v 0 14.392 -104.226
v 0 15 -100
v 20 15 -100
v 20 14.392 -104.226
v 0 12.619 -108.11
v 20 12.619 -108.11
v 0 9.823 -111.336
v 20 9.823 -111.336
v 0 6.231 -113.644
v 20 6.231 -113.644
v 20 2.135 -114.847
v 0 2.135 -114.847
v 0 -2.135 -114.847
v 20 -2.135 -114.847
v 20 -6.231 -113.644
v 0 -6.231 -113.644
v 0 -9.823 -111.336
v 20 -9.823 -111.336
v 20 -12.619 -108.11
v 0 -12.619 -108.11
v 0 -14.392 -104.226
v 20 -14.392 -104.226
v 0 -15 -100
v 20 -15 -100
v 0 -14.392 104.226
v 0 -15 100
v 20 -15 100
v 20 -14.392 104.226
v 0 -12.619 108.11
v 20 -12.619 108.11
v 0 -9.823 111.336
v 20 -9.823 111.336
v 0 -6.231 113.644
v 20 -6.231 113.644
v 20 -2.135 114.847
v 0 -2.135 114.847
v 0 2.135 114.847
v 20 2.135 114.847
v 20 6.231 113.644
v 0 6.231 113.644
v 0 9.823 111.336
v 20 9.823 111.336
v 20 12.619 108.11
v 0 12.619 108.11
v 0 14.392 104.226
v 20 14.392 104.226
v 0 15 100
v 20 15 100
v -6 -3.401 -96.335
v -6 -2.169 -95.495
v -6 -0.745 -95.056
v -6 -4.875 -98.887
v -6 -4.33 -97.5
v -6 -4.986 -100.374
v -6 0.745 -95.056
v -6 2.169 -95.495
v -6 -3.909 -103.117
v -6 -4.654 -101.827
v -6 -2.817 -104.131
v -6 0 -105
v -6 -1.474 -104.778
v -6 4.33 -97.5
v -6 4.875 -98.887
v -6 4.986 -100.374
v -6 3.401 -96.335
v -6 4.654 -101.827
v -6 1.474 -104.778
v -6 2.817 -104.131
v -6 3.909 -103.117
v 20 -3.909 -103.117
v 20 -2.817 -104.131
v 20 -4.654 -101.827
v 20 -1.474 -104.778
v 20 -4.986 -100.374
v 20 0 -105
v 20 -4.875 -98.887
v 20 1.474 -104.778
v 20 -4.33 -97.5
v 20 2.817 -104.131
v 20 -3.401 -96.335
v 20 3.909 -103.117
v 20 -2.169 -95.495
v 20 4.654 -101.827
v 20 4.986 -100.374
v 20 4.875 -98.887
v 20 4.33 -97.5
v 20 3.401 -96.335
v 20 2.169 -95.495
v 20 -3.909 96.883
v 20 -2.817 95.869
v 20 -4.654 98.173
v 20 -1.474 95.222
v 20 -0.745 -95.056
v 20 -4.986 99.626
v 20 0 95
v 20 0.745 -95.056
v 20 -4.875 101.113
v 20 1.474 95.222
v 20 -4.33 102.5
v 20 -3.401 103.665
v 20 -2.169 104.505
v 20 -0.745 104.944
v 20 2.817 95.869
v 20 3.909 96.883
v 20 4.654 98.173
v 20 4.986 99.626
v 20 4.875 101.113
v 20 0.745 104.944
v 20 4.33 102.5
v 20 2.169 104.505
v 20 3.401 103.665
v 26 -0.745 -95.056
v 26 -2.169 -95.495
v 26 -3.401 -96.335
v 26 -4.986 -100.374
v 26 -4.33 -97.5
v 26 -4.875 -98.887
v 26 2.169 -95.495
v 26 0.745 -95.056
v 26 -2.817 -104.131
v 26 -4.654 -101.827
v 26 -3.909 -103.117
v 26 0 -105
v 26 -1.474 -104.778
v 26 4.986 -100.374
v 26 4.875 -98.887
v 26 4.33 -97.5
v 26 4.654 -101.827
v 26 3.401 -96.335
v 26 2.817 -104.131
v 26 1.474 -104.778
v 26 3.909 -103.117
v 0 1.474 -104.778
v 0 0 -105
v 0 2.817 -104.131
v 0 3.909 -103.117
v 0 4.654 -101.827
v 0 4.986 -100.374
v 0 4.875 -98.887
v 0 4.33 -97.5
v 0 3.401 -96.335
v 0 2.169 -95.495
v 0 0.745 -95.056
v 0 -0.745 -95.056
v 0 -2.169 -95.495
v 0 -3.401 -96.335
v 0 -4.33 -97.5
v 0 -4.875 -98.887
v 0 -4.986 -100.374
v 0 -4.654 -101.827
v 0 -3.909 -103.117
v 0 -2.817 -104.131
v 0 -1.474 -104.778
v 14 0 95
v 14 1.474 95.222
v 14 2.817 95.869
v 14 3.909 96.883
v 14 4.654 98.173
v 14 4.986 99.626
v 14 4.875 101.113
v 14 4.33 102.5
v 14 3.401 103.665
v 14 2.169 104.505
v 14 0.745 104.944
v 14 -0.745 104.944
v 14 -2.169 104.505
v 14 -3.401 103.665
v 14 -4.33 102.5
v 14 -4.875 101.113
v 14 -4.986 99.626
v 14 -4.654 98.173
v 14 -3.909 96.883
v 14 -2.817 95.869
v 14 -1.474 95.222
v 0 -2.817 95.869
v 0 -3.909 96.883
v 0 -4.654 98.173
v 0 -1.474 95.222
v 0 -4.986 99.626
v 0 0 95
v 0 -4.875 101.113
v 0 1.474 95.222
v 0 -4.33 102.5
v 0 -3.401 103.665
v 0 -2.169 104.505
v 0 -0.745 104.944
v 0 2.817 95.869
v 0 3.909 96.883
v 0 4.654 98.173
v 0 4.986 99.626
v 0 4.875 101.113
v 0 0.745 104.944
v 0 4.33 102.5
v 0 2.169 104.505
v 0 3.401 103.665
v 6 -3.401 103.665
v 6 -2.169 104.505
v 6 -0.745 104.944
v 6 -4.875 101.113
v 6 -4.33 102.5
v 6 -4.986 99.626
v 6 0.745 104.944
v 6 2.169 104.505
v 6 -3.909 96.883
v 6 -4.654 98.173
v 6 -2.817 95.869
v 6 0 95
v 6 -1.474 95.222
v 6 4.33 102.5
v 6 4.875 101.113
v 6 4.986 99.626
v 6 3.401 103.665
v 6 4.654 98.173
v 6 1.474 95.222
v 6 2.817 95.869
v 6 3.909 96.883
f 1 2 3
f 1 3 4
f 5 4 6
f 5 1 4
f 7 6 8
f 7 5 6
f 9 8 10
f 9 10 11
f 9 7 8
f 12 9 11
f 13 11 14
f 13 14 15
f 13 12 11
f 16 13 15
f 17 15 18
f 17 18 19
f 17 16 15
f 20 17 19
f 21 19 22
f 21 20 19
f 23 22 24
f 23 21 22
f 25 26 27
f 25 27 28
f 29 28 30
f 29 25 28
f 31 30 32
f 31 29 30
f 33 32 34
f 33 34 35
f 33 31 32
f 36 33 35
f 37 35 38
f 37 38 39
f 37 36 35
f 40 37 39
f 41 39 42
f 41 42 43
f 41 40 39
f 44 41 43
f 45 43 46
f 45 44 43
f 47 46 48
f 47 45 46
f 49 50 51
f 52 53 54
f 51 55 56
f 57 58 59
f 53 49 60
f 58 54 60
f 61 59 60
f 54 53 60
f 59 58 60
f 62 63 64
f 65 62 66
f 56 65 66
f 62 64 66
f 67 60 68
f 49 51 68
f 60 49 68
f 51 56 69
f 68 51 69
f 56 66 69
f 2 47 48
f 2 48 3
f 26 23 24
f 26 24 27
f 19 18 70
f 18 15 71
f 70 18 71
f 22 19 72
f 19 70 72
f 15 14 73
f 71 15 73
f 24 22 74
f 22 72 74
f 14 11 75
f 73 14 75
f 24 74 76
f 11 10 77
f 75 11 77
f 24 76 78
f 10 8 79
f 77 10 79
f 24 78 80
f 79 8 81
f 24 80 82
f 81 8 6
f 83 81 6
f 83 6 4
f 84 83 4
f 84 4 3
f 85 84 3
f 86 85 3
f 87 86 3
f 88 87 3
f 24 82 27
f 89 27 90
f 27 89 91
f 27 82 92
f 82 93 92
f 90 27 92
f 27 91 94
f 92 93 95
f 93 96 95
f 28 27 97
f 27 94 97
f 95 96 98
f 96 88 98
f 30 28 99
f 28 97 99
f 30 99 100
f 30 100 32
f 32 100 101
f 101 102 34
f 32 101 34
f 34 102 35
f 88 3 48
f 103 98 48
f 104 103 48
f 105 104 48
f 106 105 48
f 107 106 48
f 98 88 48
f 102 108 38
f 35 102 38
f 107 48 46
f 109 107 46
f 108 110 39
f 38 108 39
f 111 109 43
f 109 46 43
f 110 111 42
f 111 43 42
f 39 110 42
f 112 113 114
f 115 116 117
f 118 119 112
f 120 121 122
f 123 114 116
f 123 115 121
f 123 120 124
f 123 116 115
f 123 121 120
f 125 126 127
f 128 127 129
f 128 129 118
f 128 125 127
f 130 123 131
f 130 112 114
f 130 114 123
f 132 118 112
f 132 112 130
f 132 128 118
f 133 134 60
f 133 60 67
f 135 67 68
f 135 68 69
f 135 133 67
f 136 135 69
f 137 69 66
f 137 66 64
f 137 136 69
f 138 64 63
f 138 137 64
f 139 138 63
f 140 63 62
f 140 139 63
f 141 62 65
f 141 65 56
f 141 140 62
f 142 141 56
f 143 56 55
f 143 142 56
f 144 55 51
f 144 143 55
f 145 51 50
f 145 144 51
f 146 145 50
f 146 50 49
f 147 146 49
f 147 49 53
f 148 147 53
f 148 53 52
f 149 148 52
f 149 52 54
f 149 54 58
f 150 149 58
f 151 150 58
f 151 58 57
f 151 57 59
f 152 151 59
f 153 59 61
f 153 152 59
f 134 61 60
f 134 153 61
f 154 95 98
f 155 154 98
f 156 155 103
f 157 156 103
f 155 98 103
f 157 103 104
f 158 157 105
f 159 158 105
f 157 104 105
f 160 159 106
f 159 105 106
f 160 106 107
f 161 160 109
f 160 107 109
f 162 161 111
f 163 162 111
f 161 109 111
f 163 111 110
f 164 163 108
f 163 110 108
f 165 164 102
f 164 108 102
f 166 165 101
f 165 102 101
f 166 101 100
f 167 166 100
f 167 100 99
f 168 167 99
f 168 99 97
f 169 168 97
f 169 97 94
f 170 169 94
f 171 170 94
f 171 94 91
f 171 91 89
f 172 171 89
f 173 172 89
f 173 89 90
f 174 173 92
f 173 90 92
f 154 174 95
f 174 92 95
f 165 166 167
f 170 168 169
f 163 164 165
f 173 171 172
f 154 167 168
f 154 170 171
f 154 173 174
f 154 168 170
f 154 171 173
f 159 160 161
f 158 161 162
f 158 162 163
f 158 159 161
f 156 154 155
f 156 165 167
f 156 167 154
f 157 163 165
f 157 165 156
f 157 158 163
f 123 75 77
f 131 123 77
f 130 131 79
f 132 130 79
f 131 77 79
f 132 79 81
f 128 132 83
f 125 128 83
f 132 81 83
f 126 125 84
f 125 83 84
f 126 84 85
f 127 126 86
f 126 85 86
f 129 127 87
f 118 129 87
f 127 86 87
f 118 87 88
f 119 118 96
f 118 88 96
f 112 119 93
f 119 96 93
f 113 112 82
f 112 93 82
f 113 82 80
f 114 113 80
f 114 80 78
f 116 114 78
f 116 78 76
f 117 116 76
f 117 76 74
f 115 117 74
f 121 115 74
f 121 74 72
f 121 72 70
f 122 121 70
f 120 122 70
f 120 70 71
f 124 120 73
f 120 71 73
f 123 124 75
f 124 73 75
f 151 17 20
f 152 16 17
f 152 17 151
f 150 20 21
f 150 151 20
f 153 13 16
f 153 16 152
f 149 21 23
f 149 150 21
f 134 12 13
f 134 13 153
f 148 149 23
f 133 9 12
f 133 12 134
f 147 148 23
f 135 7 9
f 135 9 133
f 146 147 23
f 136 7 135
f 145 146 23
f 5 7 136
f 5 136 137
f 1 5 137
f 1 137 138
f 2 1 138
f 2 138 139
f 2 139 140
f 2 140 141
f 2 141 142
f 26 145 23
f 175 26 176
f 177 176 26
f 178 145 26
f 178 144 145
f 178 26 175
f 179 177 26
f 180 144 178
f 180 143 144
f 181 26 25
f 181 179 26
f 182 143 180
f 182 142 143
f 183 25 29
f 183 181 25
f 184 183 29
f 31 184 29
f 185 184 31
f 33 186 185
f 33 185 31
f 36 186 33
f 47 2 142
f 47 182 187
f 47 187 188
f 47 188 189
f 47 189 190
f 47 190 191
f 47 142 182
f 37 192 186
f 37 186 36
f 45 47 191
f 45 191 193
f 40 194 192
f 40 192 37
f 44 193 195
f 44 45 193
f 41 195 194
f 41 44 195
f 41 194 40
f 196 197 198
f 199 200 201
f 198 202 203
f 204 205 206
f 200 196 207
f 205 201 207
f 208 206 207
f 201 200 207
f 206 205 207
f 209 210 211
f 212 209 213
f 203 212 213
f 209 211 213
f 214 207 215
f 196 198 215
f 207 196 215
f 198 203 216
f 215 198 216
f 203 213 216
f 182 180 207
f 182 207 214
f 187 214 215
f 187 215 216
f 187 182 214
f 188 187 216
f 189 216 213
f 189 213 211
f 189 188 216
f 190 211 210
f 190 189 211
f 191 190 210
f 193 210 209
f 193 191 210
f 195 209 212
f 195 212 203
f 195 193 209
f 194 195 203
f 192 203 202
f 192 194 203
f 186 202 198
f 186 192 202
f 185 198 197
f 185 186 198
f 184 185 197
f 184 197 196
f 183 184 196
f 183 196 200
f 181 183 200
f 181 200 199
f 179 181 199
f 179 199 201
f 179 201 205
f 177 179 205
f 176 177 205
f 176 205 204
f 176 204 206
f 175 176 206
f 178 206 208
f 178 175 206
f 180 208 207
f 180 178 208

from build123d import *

# Parameters (mm, degrees)
BOSS_EXTRUDE2_DEPTH = 20
SKETCH4_R           = 5
BOSS_EXTRUDE3_DEPTH = 6
SKETCH5_R           = 5
CUT_EXTRUDE1_DEPTH  = 6


with BuildPart() as part:
    # Sketch3 → Boss-Extrude2 (new body)
    with BuildSketch(Plane(origin=(0, 0, 0), x_dir=(0, 0, -1), z_dir=(1, 0, 0))):
        with BuildLine():
            Line((100, -15), (-100, -15))
            ThreePointArc((-100, -15), (-115, 0), (-100, 15))
            Line((-100, 15), (100.0000001, 15))
            ThreePointArc((100.0000001, 15), (115.00000005, -5e-08), (100, -15))
        make_face()
    extrude(amount=BOSS_EXTRUDE2_DEPTH)

    # Sketch4 → Boss-Extrude3 (add)
    with BuildSketch(Plane(origin=(20, 0, 0), x_dir=(0, 0, -1), z_dir=(1, 0, 0))):
        with Locations((100.00000005, 0)):
            Circle(SKETCH4_R)
    boss_extrude3 = extrude(amount=BOSS_EXTRUDE3_DEPTH)

    # Sketch5 → Cut-Extrude1 (cut)
    with BuildSketch(Plane(origin=(20, 0, 0), x_dir=(0, 0, -1), z_dir=(1, 0, 0))):
        with Locations((-100, 0)):
            Circle(SKETCH5_R)
    cut_extrude1 = extrude(amount=-CUT_EXTRUDE1_DEPTH, mode=Mode.SUBTRACT)

    # Mirror1: Boss-Extrude3, Cut-Extrude1 across plane
    add(boss_extrude3.mirror(Plane(origin=(10, 0, 0), x_dir=(0, 0, 1), z_dir=(1, 0, 0))))
    add(cut_extrude1.mirror(Plane(origin=(10, 0, 0), x_dir=(0, 0, 1), z_dir=(1, 0, 0))), mode=Mode.SUBTRACT)


solid = part.part
